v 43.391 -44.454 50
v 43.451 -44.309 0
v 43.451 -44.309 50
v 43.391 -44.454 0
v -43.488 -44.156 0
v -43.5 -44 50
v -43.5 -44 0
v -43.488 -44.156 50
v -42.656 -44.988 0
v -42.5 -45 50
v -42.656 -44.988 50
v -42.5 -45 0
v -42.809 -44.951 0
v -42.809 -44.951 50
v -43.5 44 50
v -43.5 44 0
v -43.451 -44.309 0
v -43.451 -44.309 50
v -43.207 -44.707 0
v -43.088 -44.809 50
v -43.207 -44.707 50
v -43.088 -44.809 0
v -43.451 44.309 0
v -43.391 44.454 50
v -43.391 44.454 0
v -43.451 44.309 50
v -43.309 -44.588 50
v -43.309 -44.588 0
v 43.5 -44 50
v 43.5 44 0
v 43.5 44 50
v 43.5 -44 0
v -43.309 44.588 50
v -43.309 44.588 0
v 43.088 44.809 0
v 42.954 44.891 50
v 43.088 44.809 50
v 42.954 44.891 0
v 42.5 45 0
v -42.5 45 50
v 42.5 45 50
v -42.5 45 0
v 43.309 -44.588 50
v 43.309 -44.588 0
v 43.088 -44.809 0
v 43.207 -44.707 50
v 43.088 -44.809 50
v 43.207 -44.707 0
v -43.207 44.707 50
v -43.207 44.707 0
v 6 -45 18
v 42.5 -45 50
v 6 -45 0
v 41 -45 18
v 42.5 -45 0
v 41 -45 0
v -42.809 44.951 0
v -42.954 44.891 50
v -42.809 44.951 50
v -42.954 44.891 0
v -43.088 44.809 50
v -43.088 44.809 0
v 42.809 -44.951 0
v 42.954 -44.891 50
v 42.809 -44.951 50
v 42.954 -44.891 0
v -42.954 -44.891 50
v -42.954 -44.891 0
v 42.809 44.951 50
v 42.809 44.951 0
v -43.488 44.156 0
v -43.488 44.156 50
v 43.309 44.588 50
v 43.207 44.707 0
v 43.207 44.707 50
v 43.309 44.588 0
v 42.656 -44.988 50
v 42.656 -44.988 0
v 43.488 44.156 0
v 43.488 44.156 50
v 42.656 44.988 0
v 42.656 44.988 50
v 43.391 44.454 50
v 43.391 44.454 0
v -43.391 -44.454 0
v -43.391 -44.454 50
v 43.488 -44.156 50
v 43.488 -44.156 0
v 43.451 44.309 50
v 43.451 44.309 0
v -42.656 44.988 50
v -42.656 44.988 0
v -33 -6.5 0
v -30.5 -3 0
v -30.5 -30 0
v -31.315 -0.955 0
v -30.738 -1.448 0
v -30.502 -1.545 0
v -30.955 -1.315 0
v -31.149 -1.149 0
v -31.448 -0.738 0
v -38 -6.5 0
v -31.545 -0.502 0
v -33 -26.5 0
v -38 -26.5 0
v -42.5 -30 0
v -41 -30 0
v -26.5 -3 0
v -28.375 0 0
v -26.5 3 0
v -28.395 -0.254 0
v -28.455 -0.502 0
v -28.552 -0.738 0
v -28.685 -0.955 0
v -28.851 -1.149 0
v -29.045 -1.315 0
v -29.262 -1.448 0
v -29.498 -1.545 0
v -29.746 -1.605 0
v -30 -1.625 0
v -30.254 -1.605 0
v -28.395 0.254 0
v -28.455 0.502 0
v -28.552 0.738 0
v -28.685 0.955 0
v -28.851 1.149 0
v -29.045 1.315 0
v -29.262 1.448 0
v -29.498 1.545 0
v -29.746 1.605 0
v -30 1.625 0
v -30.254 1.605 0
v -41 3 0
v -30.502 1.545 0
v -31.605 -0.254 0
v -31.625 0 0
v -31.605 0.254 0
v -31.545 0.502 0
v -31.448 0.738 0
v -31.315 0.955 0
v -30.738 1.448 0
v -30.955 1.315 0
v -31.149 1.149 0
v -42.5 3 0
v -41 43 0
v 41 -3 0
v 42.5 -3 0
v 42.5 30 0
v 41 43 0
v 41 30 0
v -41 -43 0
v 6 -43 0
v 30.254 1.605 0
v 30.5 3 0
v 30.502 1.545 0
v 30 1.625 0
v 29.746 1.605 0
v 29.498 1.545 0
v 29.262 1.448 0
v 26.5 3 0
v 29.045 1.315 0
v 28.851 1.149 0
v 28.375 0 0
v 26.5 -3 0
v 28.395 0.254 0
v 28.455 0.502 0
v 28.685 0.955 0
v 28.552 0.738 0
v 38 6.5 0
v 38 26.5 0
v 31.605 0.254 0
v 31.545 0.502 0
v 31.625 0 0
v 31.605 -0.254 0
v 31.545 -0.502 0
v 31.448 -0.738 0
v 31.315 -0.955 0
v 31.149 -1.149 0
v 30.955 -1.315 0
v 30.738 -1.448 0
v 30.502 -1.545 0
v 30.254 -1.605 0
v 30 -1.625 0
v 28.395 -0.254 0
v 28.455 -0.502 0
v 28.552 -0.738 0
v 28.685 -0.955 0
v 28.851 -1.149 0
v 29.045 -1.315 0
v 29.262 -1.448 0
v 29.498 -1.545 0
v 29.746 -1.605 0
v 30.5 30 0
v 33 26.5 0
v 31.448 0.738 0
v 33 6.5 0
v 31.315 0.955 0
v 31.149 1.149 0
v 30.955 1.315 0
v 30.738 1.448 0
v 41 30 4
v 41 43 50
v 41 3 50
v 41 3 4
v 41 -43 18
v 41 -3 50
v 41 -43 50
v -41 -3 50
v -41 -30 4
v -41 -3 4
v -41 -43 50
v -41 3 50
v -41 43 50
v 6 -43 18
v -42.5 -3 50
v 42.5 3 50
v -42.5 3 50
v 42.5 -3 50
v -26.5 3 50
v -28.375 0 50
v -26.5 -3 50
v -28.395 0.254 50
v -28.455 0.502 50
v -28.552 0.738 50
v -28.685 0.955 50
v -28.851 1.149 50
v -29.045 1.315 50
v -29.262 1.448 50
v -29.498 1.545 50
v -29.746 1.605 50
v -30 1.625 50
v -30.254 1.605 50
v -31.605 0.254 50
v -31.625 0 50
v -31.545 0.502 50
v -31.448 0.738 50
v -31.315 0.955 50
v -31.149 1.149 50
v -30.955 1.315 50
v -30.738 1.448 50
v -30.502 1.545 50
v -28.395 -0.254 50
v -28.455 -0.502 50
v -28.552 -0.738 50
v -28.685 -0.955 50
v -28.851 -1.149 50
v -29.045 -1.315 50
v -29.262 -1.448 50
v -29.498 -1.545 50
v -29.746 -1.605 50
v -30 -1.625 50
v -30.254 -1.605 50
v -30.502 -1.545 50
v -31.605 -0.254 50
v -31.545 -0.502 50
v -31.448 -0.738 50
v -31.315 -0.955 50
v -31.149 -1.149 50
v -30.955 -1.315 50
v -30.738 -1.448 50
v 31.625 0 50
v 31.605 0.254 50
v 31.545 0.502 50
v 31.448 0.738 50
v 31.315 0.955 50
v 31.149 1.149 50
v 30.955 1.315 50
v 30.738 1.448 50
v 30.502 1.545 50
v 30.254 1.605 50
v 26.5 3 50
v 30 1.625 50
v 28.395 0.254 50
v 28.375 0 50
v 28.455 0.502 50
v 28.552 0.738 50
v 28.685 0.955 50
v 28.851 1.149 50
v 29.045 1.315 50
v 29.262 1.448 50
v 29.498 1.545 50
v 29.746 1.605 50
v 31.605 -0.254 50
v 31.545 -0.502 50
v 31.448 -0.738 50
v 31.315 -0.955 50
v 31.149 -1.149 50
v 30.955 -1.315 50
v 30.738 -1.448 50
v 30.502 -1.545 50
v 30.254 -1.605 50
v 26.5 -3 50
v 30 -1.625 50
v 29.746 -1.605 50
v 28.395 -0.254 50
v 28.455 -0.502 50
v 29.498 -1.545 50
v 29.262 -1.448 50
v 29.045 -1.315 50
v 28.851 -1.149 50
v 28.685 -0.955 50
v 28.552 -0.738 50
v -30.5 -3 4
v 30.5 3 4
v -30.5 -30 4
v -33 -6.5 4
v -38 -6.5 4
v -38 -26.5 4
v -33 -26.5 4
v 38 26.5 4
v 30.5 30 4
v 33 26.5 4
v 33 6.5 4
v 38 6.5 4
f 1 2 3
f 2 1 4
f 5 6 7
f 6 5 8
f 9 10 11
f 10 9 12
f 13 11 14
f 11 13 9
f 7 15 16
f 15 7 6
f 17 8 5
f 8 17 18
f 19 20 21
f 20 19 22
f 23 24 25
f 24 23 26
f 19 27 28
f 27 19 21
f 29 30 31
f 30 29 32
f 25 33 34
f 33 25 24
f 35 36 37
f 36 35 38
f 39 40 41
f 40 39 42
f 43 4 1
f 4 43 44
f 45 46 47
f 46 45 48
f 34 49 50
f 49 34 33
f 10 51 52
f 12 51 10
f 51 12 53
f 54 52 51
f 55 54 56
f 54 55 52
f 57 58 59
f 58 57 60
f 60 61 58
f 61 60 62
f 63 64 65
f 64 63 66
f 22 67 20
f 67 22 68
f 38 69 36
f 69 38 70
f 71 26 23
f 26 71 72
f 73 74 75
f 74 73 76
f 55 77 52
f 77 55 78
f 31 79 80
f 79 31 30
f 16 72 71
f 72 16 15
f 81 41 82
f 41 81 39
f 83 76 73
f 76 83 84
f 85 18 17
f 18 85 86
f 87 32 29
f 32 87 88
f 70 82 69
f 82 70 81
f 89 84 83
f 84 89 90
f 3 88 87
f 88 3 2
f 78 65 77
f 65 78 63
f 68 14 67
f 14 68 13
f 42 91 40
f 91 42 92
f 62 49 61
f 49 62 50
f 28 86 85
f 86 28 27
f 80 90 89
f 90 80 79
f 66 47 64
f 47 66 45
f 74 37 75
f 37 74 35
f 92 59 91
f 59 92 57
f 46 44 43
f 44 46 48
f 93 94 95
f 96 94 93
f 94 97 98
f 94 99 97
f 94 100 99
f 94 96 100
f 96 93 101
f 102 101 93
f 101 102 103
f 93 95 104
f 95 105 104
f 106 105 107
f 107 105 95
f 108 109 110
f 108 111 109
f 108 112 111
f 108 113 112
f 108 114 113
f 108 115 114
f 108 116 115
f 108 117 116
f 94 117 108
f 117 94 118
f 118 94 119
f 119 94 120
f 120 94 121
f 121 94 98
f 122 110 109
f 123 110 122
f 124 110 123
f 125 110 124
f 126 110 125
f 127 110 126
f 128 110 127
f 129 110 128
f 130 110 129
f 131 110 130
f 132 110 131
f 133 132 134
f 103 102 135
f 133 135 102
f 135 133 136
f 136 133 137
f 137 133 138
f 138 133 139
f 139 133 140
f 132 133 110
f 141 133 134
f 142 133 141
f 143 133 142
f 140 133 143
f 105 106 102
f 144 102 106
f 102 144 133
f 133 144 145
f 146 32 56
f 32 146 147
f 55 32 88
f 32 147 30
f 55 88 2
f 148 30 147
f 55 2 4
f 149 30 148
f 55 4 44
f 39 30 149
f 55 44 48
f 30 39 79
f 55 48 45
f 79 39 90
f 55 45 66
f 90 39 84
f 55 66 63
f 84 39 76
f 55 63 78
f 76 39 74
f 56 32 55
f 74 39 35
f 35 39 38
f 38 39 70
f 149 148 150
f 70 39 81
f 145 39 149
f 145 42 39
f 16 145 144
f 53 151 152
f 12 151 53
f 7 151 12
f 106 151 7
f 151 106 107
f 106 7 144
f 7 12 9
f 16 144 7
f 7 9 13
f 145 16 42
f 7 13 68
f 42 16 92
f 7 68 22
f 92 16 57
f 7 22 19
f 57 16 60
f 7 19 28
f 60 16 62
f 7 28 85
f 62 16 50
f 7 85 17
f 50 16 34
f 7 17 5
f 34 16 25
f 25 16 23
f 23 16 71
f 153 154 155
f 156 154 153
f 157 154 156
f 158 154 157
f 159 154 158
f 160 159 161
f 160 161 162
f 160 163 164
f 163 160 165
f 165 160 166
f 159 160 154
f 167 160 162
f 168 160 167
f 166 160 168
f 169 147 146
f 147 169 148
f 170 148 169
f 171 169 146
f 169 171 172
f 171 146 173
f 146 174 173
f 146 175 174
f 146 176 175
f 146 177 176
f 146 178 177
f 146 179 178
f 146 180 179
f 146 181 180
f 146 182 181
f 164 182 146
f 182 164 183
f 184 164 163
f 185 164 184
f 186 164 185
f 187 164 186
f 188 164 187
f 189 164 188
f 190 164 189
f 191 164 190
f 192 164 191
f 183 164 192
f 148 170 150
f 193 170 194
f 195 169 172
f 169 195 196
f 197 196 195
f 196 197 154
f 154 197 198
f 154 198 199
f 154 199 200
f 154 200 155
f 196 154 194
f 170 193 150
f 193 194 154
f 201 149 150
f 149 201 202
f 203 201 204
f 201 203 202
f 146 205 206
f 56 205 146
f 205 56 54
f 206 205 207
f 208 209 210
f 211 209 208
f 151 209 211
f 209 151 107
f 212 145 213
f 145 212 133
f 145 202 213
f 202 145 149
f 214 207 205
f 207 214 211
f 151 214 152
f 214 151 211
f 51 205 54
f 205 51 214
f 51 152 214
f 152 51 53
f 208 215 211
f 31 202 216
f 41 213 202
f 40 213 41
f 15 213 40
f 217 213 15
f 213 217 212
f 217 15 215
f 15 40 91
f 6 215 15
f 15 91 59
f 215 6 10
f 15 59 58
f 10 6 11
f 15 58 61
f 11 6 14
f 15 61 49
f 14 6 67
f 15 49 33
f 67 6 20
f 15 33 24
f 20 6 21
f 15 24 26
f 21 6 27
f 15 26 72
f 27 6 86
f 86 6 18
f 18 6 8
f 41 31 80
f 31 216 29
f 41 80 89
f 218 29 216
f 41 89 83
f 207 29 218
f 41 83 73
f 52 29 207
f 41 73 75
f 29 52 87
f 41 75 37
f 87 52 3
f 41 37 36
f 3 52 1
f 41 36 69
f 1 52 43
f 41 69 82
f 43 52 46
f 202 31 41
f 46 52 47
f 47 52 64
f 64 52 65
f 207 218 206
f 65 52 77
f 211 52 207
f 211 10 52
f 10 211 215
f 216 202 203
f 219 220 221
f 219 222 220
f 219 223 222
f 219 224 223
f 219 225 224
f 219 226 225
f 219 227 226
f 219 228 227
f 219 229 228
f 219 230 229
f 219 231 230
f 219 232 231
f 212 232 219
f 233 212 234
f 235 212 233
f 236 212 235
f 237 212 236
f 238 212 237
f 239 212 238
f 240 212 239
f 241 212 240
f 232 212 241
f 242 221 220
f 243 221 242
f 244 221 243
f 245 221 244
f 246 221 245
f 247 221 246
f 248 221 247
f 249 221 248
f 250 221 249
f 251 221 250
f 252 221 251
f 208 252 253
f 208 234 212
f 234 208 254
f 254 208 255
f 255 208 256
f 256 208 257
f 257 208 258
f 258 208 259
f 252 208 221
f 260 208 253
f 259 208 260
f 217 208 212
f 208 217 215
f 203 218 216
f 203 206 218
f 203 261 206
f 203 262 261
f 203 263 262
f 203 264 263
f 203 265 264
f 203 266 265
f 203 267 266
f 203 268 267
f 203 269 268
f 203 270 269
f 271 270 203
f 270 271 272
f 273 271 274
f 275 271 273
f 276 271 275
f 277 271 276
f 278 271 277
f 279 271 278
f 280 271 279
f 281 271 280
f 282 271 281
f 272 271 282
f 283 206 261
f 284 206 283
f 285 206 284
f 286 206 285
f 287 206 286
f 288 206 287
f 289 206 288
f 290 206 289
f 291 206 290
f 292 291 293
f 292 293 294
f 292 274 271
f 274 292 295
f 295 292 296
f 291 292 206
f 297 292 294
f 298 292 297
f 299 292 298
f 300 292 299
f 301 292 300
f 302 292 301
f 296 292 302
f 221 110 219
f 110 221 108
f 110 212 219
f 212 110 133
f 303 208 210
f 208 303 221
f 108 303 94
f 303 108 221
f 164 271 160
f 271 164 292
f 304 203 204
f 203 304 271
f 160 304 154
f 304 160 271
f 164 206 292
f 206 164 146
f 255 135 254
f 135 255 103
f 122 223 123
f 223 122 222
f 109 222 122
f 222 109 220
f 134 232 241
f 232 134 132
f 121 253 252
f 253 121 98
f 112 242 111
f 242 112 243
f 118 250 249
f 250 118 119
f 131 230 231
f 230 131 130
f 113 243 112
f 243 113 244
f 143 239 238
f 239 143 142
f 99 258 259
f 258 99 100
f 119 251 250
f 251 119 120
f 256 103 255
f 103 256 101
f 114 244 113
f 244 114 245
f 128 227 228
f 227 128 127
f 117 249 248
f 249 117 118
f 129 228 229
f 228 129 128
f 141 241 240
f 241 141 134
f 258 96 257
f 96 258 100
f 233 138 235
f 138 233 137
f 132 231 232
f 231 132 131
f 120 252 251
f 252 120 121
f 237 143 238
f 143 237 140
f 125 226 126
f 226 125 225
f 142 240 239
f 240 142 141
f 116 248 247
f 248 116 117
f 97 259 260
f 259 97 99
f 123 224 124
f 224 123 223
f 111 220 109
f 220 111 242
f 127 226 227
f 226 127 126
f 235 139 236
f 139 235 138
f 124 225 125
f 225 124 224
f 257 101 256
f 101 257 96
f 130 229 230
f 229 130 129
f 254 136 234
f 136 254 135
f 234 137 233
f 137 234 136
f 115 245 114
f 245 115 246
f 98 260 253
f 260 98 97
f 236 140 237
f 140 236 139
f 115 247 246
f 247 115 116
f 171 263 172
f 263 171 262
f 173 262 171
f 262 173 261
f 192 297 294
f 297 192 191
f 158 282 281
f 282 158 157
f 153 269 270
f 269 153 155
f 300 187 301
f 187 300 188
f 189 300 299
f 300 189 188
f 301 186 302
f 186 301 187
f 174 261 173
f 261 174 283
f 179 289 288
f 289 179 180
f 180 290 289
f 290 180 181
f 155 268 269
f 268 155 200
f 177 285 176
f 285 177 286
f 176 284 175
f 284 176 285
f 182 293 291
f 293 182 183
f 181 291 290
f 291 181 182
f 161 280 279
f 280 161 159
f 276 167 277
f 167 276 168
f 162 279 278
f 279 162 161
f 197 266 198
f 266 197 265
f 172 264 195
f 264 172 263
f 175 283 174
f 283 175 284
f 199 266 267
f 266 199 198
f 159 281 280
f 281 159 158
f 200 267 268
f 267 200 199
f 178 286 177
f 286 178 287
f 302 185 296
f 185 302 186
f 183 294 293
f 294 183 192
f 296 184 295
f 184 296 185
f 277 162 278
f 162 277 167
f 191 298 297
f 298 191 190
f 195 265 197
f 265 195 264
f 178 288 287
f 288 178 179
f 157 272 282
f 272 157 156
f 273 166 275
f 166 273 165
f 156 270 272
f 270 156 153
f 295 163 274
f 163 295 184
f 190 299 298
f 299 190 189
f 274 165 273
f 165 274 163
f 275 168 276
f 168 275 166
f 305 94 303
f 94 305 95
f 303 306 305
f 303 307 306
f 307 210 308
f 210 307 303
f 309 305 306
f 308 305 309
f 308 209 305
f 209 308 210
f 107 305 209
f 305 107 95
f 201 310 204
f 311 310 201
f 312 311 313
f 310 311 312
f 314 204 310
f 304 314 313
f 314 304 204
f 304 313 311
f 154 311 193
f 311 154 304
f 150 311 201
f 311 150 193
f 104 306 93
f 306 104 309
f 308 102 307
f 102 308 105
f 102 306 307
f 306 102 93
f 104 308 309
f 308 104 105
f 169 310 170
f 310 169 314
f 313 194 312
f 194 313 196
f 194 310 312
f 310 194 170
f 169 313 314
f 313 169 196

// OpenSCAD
$fn = 40;

ytterbredd = 85;
innerbredd = 82;
ytterhojd = 88;
innerhojd = 86;
djup = 50;

uttagbredd = 35;
uttagdjup = 18;

skruvghojd = 6;
skruvgbredd = 16;

halavstand = 60;
haldia = 3.25;

lhalavstand = 71;
lhalbredd = 5;
lhalhojd = 20;

lskruvgbredd = 12;
lskruvghojd = 27;
lskruvgdjup = 4;

lada();

module lada() {
  difference() {
    translate([-ytterbredd / 2, -ytterhojd / 2, 0])
      minkowski() {
        cube(size=[ytterbredd, ytterhojd, djup]);
        cylinder(h=2.5);
      }
    // Rensa bort innerutrymmet
    translate([-innerbredd / 2, -innerhojd / 2, -2])
      cube(size=[innerbredd, innerhojd, djup + 4]);

    // Uttagsplats 
    translate([innerbredd / 2 - uttagbredd, -ytterhojd / 2 - 5, -4])
      cube(size=[uttagbredd, 20, uttagdjup + 4]);

    // Töm ovanför
    translate([-ytterbredd / 2 - 2, -ytterhojd / 2 - 2, djup])
      cube(size=[ytterbredd + 4, ytterhojd + 4, 5]);

    // Töm under
    translate([-ytterbredd / 2 - 2, -ytterhojd / 2 - 2, -5])
      cube(size=[ytterbredd + 4, ytterhojd + 4, 5]);
  }

  difference() {
    union() {
      translate([-ytterbredd / 2, -skruvghojd / 2, 0])
        skruvgrej();

      translate([ytterbredd / 2 - skruvgbredd, -skruvghojd / 2, 0])
        skruvgrej();
    }
    union() {
      translate([-halavstand / 2, 0, -1])
        cylinder(h=djup + 2, d=haldia);

      translate([halavstand / 2, 0, -1])
        cylinder(h=djup + 2, d=haldia);
    }
  }

  difference() {
    union() {
      translate([-ytterbredd / 2, -skruvghojd / 2 - lskruvghojd, 0])
        litenskruvgrej();

      translate([ytterbredd / 2 - lskruvgbredd, skruvghojd / 2, 0])
        litenskruvgrej();
    }
    union() {
      translate([-lhalavstand / 2, -skruvghojd / 2 - lskruvghojd / 2, -1])
        cube(size=[lhalbredd, lhalhojd, djup + 2], center=true);

      translate([lhalavstand / 2, skruvghojd / 2 + lskruvghojd / 2, -1])
        cube(size=[lhalbredd, lhalhojd, djup + 2], center=true);
    }
  }
}

module skruvgrej() {
  cube(size=[skruvgbredd, skruvghojd, djup]);
}

module litenskruvgrej() {
  cube(size=[lskruvgbredd, lskruvghojd, lskruvgdjup]);
}
